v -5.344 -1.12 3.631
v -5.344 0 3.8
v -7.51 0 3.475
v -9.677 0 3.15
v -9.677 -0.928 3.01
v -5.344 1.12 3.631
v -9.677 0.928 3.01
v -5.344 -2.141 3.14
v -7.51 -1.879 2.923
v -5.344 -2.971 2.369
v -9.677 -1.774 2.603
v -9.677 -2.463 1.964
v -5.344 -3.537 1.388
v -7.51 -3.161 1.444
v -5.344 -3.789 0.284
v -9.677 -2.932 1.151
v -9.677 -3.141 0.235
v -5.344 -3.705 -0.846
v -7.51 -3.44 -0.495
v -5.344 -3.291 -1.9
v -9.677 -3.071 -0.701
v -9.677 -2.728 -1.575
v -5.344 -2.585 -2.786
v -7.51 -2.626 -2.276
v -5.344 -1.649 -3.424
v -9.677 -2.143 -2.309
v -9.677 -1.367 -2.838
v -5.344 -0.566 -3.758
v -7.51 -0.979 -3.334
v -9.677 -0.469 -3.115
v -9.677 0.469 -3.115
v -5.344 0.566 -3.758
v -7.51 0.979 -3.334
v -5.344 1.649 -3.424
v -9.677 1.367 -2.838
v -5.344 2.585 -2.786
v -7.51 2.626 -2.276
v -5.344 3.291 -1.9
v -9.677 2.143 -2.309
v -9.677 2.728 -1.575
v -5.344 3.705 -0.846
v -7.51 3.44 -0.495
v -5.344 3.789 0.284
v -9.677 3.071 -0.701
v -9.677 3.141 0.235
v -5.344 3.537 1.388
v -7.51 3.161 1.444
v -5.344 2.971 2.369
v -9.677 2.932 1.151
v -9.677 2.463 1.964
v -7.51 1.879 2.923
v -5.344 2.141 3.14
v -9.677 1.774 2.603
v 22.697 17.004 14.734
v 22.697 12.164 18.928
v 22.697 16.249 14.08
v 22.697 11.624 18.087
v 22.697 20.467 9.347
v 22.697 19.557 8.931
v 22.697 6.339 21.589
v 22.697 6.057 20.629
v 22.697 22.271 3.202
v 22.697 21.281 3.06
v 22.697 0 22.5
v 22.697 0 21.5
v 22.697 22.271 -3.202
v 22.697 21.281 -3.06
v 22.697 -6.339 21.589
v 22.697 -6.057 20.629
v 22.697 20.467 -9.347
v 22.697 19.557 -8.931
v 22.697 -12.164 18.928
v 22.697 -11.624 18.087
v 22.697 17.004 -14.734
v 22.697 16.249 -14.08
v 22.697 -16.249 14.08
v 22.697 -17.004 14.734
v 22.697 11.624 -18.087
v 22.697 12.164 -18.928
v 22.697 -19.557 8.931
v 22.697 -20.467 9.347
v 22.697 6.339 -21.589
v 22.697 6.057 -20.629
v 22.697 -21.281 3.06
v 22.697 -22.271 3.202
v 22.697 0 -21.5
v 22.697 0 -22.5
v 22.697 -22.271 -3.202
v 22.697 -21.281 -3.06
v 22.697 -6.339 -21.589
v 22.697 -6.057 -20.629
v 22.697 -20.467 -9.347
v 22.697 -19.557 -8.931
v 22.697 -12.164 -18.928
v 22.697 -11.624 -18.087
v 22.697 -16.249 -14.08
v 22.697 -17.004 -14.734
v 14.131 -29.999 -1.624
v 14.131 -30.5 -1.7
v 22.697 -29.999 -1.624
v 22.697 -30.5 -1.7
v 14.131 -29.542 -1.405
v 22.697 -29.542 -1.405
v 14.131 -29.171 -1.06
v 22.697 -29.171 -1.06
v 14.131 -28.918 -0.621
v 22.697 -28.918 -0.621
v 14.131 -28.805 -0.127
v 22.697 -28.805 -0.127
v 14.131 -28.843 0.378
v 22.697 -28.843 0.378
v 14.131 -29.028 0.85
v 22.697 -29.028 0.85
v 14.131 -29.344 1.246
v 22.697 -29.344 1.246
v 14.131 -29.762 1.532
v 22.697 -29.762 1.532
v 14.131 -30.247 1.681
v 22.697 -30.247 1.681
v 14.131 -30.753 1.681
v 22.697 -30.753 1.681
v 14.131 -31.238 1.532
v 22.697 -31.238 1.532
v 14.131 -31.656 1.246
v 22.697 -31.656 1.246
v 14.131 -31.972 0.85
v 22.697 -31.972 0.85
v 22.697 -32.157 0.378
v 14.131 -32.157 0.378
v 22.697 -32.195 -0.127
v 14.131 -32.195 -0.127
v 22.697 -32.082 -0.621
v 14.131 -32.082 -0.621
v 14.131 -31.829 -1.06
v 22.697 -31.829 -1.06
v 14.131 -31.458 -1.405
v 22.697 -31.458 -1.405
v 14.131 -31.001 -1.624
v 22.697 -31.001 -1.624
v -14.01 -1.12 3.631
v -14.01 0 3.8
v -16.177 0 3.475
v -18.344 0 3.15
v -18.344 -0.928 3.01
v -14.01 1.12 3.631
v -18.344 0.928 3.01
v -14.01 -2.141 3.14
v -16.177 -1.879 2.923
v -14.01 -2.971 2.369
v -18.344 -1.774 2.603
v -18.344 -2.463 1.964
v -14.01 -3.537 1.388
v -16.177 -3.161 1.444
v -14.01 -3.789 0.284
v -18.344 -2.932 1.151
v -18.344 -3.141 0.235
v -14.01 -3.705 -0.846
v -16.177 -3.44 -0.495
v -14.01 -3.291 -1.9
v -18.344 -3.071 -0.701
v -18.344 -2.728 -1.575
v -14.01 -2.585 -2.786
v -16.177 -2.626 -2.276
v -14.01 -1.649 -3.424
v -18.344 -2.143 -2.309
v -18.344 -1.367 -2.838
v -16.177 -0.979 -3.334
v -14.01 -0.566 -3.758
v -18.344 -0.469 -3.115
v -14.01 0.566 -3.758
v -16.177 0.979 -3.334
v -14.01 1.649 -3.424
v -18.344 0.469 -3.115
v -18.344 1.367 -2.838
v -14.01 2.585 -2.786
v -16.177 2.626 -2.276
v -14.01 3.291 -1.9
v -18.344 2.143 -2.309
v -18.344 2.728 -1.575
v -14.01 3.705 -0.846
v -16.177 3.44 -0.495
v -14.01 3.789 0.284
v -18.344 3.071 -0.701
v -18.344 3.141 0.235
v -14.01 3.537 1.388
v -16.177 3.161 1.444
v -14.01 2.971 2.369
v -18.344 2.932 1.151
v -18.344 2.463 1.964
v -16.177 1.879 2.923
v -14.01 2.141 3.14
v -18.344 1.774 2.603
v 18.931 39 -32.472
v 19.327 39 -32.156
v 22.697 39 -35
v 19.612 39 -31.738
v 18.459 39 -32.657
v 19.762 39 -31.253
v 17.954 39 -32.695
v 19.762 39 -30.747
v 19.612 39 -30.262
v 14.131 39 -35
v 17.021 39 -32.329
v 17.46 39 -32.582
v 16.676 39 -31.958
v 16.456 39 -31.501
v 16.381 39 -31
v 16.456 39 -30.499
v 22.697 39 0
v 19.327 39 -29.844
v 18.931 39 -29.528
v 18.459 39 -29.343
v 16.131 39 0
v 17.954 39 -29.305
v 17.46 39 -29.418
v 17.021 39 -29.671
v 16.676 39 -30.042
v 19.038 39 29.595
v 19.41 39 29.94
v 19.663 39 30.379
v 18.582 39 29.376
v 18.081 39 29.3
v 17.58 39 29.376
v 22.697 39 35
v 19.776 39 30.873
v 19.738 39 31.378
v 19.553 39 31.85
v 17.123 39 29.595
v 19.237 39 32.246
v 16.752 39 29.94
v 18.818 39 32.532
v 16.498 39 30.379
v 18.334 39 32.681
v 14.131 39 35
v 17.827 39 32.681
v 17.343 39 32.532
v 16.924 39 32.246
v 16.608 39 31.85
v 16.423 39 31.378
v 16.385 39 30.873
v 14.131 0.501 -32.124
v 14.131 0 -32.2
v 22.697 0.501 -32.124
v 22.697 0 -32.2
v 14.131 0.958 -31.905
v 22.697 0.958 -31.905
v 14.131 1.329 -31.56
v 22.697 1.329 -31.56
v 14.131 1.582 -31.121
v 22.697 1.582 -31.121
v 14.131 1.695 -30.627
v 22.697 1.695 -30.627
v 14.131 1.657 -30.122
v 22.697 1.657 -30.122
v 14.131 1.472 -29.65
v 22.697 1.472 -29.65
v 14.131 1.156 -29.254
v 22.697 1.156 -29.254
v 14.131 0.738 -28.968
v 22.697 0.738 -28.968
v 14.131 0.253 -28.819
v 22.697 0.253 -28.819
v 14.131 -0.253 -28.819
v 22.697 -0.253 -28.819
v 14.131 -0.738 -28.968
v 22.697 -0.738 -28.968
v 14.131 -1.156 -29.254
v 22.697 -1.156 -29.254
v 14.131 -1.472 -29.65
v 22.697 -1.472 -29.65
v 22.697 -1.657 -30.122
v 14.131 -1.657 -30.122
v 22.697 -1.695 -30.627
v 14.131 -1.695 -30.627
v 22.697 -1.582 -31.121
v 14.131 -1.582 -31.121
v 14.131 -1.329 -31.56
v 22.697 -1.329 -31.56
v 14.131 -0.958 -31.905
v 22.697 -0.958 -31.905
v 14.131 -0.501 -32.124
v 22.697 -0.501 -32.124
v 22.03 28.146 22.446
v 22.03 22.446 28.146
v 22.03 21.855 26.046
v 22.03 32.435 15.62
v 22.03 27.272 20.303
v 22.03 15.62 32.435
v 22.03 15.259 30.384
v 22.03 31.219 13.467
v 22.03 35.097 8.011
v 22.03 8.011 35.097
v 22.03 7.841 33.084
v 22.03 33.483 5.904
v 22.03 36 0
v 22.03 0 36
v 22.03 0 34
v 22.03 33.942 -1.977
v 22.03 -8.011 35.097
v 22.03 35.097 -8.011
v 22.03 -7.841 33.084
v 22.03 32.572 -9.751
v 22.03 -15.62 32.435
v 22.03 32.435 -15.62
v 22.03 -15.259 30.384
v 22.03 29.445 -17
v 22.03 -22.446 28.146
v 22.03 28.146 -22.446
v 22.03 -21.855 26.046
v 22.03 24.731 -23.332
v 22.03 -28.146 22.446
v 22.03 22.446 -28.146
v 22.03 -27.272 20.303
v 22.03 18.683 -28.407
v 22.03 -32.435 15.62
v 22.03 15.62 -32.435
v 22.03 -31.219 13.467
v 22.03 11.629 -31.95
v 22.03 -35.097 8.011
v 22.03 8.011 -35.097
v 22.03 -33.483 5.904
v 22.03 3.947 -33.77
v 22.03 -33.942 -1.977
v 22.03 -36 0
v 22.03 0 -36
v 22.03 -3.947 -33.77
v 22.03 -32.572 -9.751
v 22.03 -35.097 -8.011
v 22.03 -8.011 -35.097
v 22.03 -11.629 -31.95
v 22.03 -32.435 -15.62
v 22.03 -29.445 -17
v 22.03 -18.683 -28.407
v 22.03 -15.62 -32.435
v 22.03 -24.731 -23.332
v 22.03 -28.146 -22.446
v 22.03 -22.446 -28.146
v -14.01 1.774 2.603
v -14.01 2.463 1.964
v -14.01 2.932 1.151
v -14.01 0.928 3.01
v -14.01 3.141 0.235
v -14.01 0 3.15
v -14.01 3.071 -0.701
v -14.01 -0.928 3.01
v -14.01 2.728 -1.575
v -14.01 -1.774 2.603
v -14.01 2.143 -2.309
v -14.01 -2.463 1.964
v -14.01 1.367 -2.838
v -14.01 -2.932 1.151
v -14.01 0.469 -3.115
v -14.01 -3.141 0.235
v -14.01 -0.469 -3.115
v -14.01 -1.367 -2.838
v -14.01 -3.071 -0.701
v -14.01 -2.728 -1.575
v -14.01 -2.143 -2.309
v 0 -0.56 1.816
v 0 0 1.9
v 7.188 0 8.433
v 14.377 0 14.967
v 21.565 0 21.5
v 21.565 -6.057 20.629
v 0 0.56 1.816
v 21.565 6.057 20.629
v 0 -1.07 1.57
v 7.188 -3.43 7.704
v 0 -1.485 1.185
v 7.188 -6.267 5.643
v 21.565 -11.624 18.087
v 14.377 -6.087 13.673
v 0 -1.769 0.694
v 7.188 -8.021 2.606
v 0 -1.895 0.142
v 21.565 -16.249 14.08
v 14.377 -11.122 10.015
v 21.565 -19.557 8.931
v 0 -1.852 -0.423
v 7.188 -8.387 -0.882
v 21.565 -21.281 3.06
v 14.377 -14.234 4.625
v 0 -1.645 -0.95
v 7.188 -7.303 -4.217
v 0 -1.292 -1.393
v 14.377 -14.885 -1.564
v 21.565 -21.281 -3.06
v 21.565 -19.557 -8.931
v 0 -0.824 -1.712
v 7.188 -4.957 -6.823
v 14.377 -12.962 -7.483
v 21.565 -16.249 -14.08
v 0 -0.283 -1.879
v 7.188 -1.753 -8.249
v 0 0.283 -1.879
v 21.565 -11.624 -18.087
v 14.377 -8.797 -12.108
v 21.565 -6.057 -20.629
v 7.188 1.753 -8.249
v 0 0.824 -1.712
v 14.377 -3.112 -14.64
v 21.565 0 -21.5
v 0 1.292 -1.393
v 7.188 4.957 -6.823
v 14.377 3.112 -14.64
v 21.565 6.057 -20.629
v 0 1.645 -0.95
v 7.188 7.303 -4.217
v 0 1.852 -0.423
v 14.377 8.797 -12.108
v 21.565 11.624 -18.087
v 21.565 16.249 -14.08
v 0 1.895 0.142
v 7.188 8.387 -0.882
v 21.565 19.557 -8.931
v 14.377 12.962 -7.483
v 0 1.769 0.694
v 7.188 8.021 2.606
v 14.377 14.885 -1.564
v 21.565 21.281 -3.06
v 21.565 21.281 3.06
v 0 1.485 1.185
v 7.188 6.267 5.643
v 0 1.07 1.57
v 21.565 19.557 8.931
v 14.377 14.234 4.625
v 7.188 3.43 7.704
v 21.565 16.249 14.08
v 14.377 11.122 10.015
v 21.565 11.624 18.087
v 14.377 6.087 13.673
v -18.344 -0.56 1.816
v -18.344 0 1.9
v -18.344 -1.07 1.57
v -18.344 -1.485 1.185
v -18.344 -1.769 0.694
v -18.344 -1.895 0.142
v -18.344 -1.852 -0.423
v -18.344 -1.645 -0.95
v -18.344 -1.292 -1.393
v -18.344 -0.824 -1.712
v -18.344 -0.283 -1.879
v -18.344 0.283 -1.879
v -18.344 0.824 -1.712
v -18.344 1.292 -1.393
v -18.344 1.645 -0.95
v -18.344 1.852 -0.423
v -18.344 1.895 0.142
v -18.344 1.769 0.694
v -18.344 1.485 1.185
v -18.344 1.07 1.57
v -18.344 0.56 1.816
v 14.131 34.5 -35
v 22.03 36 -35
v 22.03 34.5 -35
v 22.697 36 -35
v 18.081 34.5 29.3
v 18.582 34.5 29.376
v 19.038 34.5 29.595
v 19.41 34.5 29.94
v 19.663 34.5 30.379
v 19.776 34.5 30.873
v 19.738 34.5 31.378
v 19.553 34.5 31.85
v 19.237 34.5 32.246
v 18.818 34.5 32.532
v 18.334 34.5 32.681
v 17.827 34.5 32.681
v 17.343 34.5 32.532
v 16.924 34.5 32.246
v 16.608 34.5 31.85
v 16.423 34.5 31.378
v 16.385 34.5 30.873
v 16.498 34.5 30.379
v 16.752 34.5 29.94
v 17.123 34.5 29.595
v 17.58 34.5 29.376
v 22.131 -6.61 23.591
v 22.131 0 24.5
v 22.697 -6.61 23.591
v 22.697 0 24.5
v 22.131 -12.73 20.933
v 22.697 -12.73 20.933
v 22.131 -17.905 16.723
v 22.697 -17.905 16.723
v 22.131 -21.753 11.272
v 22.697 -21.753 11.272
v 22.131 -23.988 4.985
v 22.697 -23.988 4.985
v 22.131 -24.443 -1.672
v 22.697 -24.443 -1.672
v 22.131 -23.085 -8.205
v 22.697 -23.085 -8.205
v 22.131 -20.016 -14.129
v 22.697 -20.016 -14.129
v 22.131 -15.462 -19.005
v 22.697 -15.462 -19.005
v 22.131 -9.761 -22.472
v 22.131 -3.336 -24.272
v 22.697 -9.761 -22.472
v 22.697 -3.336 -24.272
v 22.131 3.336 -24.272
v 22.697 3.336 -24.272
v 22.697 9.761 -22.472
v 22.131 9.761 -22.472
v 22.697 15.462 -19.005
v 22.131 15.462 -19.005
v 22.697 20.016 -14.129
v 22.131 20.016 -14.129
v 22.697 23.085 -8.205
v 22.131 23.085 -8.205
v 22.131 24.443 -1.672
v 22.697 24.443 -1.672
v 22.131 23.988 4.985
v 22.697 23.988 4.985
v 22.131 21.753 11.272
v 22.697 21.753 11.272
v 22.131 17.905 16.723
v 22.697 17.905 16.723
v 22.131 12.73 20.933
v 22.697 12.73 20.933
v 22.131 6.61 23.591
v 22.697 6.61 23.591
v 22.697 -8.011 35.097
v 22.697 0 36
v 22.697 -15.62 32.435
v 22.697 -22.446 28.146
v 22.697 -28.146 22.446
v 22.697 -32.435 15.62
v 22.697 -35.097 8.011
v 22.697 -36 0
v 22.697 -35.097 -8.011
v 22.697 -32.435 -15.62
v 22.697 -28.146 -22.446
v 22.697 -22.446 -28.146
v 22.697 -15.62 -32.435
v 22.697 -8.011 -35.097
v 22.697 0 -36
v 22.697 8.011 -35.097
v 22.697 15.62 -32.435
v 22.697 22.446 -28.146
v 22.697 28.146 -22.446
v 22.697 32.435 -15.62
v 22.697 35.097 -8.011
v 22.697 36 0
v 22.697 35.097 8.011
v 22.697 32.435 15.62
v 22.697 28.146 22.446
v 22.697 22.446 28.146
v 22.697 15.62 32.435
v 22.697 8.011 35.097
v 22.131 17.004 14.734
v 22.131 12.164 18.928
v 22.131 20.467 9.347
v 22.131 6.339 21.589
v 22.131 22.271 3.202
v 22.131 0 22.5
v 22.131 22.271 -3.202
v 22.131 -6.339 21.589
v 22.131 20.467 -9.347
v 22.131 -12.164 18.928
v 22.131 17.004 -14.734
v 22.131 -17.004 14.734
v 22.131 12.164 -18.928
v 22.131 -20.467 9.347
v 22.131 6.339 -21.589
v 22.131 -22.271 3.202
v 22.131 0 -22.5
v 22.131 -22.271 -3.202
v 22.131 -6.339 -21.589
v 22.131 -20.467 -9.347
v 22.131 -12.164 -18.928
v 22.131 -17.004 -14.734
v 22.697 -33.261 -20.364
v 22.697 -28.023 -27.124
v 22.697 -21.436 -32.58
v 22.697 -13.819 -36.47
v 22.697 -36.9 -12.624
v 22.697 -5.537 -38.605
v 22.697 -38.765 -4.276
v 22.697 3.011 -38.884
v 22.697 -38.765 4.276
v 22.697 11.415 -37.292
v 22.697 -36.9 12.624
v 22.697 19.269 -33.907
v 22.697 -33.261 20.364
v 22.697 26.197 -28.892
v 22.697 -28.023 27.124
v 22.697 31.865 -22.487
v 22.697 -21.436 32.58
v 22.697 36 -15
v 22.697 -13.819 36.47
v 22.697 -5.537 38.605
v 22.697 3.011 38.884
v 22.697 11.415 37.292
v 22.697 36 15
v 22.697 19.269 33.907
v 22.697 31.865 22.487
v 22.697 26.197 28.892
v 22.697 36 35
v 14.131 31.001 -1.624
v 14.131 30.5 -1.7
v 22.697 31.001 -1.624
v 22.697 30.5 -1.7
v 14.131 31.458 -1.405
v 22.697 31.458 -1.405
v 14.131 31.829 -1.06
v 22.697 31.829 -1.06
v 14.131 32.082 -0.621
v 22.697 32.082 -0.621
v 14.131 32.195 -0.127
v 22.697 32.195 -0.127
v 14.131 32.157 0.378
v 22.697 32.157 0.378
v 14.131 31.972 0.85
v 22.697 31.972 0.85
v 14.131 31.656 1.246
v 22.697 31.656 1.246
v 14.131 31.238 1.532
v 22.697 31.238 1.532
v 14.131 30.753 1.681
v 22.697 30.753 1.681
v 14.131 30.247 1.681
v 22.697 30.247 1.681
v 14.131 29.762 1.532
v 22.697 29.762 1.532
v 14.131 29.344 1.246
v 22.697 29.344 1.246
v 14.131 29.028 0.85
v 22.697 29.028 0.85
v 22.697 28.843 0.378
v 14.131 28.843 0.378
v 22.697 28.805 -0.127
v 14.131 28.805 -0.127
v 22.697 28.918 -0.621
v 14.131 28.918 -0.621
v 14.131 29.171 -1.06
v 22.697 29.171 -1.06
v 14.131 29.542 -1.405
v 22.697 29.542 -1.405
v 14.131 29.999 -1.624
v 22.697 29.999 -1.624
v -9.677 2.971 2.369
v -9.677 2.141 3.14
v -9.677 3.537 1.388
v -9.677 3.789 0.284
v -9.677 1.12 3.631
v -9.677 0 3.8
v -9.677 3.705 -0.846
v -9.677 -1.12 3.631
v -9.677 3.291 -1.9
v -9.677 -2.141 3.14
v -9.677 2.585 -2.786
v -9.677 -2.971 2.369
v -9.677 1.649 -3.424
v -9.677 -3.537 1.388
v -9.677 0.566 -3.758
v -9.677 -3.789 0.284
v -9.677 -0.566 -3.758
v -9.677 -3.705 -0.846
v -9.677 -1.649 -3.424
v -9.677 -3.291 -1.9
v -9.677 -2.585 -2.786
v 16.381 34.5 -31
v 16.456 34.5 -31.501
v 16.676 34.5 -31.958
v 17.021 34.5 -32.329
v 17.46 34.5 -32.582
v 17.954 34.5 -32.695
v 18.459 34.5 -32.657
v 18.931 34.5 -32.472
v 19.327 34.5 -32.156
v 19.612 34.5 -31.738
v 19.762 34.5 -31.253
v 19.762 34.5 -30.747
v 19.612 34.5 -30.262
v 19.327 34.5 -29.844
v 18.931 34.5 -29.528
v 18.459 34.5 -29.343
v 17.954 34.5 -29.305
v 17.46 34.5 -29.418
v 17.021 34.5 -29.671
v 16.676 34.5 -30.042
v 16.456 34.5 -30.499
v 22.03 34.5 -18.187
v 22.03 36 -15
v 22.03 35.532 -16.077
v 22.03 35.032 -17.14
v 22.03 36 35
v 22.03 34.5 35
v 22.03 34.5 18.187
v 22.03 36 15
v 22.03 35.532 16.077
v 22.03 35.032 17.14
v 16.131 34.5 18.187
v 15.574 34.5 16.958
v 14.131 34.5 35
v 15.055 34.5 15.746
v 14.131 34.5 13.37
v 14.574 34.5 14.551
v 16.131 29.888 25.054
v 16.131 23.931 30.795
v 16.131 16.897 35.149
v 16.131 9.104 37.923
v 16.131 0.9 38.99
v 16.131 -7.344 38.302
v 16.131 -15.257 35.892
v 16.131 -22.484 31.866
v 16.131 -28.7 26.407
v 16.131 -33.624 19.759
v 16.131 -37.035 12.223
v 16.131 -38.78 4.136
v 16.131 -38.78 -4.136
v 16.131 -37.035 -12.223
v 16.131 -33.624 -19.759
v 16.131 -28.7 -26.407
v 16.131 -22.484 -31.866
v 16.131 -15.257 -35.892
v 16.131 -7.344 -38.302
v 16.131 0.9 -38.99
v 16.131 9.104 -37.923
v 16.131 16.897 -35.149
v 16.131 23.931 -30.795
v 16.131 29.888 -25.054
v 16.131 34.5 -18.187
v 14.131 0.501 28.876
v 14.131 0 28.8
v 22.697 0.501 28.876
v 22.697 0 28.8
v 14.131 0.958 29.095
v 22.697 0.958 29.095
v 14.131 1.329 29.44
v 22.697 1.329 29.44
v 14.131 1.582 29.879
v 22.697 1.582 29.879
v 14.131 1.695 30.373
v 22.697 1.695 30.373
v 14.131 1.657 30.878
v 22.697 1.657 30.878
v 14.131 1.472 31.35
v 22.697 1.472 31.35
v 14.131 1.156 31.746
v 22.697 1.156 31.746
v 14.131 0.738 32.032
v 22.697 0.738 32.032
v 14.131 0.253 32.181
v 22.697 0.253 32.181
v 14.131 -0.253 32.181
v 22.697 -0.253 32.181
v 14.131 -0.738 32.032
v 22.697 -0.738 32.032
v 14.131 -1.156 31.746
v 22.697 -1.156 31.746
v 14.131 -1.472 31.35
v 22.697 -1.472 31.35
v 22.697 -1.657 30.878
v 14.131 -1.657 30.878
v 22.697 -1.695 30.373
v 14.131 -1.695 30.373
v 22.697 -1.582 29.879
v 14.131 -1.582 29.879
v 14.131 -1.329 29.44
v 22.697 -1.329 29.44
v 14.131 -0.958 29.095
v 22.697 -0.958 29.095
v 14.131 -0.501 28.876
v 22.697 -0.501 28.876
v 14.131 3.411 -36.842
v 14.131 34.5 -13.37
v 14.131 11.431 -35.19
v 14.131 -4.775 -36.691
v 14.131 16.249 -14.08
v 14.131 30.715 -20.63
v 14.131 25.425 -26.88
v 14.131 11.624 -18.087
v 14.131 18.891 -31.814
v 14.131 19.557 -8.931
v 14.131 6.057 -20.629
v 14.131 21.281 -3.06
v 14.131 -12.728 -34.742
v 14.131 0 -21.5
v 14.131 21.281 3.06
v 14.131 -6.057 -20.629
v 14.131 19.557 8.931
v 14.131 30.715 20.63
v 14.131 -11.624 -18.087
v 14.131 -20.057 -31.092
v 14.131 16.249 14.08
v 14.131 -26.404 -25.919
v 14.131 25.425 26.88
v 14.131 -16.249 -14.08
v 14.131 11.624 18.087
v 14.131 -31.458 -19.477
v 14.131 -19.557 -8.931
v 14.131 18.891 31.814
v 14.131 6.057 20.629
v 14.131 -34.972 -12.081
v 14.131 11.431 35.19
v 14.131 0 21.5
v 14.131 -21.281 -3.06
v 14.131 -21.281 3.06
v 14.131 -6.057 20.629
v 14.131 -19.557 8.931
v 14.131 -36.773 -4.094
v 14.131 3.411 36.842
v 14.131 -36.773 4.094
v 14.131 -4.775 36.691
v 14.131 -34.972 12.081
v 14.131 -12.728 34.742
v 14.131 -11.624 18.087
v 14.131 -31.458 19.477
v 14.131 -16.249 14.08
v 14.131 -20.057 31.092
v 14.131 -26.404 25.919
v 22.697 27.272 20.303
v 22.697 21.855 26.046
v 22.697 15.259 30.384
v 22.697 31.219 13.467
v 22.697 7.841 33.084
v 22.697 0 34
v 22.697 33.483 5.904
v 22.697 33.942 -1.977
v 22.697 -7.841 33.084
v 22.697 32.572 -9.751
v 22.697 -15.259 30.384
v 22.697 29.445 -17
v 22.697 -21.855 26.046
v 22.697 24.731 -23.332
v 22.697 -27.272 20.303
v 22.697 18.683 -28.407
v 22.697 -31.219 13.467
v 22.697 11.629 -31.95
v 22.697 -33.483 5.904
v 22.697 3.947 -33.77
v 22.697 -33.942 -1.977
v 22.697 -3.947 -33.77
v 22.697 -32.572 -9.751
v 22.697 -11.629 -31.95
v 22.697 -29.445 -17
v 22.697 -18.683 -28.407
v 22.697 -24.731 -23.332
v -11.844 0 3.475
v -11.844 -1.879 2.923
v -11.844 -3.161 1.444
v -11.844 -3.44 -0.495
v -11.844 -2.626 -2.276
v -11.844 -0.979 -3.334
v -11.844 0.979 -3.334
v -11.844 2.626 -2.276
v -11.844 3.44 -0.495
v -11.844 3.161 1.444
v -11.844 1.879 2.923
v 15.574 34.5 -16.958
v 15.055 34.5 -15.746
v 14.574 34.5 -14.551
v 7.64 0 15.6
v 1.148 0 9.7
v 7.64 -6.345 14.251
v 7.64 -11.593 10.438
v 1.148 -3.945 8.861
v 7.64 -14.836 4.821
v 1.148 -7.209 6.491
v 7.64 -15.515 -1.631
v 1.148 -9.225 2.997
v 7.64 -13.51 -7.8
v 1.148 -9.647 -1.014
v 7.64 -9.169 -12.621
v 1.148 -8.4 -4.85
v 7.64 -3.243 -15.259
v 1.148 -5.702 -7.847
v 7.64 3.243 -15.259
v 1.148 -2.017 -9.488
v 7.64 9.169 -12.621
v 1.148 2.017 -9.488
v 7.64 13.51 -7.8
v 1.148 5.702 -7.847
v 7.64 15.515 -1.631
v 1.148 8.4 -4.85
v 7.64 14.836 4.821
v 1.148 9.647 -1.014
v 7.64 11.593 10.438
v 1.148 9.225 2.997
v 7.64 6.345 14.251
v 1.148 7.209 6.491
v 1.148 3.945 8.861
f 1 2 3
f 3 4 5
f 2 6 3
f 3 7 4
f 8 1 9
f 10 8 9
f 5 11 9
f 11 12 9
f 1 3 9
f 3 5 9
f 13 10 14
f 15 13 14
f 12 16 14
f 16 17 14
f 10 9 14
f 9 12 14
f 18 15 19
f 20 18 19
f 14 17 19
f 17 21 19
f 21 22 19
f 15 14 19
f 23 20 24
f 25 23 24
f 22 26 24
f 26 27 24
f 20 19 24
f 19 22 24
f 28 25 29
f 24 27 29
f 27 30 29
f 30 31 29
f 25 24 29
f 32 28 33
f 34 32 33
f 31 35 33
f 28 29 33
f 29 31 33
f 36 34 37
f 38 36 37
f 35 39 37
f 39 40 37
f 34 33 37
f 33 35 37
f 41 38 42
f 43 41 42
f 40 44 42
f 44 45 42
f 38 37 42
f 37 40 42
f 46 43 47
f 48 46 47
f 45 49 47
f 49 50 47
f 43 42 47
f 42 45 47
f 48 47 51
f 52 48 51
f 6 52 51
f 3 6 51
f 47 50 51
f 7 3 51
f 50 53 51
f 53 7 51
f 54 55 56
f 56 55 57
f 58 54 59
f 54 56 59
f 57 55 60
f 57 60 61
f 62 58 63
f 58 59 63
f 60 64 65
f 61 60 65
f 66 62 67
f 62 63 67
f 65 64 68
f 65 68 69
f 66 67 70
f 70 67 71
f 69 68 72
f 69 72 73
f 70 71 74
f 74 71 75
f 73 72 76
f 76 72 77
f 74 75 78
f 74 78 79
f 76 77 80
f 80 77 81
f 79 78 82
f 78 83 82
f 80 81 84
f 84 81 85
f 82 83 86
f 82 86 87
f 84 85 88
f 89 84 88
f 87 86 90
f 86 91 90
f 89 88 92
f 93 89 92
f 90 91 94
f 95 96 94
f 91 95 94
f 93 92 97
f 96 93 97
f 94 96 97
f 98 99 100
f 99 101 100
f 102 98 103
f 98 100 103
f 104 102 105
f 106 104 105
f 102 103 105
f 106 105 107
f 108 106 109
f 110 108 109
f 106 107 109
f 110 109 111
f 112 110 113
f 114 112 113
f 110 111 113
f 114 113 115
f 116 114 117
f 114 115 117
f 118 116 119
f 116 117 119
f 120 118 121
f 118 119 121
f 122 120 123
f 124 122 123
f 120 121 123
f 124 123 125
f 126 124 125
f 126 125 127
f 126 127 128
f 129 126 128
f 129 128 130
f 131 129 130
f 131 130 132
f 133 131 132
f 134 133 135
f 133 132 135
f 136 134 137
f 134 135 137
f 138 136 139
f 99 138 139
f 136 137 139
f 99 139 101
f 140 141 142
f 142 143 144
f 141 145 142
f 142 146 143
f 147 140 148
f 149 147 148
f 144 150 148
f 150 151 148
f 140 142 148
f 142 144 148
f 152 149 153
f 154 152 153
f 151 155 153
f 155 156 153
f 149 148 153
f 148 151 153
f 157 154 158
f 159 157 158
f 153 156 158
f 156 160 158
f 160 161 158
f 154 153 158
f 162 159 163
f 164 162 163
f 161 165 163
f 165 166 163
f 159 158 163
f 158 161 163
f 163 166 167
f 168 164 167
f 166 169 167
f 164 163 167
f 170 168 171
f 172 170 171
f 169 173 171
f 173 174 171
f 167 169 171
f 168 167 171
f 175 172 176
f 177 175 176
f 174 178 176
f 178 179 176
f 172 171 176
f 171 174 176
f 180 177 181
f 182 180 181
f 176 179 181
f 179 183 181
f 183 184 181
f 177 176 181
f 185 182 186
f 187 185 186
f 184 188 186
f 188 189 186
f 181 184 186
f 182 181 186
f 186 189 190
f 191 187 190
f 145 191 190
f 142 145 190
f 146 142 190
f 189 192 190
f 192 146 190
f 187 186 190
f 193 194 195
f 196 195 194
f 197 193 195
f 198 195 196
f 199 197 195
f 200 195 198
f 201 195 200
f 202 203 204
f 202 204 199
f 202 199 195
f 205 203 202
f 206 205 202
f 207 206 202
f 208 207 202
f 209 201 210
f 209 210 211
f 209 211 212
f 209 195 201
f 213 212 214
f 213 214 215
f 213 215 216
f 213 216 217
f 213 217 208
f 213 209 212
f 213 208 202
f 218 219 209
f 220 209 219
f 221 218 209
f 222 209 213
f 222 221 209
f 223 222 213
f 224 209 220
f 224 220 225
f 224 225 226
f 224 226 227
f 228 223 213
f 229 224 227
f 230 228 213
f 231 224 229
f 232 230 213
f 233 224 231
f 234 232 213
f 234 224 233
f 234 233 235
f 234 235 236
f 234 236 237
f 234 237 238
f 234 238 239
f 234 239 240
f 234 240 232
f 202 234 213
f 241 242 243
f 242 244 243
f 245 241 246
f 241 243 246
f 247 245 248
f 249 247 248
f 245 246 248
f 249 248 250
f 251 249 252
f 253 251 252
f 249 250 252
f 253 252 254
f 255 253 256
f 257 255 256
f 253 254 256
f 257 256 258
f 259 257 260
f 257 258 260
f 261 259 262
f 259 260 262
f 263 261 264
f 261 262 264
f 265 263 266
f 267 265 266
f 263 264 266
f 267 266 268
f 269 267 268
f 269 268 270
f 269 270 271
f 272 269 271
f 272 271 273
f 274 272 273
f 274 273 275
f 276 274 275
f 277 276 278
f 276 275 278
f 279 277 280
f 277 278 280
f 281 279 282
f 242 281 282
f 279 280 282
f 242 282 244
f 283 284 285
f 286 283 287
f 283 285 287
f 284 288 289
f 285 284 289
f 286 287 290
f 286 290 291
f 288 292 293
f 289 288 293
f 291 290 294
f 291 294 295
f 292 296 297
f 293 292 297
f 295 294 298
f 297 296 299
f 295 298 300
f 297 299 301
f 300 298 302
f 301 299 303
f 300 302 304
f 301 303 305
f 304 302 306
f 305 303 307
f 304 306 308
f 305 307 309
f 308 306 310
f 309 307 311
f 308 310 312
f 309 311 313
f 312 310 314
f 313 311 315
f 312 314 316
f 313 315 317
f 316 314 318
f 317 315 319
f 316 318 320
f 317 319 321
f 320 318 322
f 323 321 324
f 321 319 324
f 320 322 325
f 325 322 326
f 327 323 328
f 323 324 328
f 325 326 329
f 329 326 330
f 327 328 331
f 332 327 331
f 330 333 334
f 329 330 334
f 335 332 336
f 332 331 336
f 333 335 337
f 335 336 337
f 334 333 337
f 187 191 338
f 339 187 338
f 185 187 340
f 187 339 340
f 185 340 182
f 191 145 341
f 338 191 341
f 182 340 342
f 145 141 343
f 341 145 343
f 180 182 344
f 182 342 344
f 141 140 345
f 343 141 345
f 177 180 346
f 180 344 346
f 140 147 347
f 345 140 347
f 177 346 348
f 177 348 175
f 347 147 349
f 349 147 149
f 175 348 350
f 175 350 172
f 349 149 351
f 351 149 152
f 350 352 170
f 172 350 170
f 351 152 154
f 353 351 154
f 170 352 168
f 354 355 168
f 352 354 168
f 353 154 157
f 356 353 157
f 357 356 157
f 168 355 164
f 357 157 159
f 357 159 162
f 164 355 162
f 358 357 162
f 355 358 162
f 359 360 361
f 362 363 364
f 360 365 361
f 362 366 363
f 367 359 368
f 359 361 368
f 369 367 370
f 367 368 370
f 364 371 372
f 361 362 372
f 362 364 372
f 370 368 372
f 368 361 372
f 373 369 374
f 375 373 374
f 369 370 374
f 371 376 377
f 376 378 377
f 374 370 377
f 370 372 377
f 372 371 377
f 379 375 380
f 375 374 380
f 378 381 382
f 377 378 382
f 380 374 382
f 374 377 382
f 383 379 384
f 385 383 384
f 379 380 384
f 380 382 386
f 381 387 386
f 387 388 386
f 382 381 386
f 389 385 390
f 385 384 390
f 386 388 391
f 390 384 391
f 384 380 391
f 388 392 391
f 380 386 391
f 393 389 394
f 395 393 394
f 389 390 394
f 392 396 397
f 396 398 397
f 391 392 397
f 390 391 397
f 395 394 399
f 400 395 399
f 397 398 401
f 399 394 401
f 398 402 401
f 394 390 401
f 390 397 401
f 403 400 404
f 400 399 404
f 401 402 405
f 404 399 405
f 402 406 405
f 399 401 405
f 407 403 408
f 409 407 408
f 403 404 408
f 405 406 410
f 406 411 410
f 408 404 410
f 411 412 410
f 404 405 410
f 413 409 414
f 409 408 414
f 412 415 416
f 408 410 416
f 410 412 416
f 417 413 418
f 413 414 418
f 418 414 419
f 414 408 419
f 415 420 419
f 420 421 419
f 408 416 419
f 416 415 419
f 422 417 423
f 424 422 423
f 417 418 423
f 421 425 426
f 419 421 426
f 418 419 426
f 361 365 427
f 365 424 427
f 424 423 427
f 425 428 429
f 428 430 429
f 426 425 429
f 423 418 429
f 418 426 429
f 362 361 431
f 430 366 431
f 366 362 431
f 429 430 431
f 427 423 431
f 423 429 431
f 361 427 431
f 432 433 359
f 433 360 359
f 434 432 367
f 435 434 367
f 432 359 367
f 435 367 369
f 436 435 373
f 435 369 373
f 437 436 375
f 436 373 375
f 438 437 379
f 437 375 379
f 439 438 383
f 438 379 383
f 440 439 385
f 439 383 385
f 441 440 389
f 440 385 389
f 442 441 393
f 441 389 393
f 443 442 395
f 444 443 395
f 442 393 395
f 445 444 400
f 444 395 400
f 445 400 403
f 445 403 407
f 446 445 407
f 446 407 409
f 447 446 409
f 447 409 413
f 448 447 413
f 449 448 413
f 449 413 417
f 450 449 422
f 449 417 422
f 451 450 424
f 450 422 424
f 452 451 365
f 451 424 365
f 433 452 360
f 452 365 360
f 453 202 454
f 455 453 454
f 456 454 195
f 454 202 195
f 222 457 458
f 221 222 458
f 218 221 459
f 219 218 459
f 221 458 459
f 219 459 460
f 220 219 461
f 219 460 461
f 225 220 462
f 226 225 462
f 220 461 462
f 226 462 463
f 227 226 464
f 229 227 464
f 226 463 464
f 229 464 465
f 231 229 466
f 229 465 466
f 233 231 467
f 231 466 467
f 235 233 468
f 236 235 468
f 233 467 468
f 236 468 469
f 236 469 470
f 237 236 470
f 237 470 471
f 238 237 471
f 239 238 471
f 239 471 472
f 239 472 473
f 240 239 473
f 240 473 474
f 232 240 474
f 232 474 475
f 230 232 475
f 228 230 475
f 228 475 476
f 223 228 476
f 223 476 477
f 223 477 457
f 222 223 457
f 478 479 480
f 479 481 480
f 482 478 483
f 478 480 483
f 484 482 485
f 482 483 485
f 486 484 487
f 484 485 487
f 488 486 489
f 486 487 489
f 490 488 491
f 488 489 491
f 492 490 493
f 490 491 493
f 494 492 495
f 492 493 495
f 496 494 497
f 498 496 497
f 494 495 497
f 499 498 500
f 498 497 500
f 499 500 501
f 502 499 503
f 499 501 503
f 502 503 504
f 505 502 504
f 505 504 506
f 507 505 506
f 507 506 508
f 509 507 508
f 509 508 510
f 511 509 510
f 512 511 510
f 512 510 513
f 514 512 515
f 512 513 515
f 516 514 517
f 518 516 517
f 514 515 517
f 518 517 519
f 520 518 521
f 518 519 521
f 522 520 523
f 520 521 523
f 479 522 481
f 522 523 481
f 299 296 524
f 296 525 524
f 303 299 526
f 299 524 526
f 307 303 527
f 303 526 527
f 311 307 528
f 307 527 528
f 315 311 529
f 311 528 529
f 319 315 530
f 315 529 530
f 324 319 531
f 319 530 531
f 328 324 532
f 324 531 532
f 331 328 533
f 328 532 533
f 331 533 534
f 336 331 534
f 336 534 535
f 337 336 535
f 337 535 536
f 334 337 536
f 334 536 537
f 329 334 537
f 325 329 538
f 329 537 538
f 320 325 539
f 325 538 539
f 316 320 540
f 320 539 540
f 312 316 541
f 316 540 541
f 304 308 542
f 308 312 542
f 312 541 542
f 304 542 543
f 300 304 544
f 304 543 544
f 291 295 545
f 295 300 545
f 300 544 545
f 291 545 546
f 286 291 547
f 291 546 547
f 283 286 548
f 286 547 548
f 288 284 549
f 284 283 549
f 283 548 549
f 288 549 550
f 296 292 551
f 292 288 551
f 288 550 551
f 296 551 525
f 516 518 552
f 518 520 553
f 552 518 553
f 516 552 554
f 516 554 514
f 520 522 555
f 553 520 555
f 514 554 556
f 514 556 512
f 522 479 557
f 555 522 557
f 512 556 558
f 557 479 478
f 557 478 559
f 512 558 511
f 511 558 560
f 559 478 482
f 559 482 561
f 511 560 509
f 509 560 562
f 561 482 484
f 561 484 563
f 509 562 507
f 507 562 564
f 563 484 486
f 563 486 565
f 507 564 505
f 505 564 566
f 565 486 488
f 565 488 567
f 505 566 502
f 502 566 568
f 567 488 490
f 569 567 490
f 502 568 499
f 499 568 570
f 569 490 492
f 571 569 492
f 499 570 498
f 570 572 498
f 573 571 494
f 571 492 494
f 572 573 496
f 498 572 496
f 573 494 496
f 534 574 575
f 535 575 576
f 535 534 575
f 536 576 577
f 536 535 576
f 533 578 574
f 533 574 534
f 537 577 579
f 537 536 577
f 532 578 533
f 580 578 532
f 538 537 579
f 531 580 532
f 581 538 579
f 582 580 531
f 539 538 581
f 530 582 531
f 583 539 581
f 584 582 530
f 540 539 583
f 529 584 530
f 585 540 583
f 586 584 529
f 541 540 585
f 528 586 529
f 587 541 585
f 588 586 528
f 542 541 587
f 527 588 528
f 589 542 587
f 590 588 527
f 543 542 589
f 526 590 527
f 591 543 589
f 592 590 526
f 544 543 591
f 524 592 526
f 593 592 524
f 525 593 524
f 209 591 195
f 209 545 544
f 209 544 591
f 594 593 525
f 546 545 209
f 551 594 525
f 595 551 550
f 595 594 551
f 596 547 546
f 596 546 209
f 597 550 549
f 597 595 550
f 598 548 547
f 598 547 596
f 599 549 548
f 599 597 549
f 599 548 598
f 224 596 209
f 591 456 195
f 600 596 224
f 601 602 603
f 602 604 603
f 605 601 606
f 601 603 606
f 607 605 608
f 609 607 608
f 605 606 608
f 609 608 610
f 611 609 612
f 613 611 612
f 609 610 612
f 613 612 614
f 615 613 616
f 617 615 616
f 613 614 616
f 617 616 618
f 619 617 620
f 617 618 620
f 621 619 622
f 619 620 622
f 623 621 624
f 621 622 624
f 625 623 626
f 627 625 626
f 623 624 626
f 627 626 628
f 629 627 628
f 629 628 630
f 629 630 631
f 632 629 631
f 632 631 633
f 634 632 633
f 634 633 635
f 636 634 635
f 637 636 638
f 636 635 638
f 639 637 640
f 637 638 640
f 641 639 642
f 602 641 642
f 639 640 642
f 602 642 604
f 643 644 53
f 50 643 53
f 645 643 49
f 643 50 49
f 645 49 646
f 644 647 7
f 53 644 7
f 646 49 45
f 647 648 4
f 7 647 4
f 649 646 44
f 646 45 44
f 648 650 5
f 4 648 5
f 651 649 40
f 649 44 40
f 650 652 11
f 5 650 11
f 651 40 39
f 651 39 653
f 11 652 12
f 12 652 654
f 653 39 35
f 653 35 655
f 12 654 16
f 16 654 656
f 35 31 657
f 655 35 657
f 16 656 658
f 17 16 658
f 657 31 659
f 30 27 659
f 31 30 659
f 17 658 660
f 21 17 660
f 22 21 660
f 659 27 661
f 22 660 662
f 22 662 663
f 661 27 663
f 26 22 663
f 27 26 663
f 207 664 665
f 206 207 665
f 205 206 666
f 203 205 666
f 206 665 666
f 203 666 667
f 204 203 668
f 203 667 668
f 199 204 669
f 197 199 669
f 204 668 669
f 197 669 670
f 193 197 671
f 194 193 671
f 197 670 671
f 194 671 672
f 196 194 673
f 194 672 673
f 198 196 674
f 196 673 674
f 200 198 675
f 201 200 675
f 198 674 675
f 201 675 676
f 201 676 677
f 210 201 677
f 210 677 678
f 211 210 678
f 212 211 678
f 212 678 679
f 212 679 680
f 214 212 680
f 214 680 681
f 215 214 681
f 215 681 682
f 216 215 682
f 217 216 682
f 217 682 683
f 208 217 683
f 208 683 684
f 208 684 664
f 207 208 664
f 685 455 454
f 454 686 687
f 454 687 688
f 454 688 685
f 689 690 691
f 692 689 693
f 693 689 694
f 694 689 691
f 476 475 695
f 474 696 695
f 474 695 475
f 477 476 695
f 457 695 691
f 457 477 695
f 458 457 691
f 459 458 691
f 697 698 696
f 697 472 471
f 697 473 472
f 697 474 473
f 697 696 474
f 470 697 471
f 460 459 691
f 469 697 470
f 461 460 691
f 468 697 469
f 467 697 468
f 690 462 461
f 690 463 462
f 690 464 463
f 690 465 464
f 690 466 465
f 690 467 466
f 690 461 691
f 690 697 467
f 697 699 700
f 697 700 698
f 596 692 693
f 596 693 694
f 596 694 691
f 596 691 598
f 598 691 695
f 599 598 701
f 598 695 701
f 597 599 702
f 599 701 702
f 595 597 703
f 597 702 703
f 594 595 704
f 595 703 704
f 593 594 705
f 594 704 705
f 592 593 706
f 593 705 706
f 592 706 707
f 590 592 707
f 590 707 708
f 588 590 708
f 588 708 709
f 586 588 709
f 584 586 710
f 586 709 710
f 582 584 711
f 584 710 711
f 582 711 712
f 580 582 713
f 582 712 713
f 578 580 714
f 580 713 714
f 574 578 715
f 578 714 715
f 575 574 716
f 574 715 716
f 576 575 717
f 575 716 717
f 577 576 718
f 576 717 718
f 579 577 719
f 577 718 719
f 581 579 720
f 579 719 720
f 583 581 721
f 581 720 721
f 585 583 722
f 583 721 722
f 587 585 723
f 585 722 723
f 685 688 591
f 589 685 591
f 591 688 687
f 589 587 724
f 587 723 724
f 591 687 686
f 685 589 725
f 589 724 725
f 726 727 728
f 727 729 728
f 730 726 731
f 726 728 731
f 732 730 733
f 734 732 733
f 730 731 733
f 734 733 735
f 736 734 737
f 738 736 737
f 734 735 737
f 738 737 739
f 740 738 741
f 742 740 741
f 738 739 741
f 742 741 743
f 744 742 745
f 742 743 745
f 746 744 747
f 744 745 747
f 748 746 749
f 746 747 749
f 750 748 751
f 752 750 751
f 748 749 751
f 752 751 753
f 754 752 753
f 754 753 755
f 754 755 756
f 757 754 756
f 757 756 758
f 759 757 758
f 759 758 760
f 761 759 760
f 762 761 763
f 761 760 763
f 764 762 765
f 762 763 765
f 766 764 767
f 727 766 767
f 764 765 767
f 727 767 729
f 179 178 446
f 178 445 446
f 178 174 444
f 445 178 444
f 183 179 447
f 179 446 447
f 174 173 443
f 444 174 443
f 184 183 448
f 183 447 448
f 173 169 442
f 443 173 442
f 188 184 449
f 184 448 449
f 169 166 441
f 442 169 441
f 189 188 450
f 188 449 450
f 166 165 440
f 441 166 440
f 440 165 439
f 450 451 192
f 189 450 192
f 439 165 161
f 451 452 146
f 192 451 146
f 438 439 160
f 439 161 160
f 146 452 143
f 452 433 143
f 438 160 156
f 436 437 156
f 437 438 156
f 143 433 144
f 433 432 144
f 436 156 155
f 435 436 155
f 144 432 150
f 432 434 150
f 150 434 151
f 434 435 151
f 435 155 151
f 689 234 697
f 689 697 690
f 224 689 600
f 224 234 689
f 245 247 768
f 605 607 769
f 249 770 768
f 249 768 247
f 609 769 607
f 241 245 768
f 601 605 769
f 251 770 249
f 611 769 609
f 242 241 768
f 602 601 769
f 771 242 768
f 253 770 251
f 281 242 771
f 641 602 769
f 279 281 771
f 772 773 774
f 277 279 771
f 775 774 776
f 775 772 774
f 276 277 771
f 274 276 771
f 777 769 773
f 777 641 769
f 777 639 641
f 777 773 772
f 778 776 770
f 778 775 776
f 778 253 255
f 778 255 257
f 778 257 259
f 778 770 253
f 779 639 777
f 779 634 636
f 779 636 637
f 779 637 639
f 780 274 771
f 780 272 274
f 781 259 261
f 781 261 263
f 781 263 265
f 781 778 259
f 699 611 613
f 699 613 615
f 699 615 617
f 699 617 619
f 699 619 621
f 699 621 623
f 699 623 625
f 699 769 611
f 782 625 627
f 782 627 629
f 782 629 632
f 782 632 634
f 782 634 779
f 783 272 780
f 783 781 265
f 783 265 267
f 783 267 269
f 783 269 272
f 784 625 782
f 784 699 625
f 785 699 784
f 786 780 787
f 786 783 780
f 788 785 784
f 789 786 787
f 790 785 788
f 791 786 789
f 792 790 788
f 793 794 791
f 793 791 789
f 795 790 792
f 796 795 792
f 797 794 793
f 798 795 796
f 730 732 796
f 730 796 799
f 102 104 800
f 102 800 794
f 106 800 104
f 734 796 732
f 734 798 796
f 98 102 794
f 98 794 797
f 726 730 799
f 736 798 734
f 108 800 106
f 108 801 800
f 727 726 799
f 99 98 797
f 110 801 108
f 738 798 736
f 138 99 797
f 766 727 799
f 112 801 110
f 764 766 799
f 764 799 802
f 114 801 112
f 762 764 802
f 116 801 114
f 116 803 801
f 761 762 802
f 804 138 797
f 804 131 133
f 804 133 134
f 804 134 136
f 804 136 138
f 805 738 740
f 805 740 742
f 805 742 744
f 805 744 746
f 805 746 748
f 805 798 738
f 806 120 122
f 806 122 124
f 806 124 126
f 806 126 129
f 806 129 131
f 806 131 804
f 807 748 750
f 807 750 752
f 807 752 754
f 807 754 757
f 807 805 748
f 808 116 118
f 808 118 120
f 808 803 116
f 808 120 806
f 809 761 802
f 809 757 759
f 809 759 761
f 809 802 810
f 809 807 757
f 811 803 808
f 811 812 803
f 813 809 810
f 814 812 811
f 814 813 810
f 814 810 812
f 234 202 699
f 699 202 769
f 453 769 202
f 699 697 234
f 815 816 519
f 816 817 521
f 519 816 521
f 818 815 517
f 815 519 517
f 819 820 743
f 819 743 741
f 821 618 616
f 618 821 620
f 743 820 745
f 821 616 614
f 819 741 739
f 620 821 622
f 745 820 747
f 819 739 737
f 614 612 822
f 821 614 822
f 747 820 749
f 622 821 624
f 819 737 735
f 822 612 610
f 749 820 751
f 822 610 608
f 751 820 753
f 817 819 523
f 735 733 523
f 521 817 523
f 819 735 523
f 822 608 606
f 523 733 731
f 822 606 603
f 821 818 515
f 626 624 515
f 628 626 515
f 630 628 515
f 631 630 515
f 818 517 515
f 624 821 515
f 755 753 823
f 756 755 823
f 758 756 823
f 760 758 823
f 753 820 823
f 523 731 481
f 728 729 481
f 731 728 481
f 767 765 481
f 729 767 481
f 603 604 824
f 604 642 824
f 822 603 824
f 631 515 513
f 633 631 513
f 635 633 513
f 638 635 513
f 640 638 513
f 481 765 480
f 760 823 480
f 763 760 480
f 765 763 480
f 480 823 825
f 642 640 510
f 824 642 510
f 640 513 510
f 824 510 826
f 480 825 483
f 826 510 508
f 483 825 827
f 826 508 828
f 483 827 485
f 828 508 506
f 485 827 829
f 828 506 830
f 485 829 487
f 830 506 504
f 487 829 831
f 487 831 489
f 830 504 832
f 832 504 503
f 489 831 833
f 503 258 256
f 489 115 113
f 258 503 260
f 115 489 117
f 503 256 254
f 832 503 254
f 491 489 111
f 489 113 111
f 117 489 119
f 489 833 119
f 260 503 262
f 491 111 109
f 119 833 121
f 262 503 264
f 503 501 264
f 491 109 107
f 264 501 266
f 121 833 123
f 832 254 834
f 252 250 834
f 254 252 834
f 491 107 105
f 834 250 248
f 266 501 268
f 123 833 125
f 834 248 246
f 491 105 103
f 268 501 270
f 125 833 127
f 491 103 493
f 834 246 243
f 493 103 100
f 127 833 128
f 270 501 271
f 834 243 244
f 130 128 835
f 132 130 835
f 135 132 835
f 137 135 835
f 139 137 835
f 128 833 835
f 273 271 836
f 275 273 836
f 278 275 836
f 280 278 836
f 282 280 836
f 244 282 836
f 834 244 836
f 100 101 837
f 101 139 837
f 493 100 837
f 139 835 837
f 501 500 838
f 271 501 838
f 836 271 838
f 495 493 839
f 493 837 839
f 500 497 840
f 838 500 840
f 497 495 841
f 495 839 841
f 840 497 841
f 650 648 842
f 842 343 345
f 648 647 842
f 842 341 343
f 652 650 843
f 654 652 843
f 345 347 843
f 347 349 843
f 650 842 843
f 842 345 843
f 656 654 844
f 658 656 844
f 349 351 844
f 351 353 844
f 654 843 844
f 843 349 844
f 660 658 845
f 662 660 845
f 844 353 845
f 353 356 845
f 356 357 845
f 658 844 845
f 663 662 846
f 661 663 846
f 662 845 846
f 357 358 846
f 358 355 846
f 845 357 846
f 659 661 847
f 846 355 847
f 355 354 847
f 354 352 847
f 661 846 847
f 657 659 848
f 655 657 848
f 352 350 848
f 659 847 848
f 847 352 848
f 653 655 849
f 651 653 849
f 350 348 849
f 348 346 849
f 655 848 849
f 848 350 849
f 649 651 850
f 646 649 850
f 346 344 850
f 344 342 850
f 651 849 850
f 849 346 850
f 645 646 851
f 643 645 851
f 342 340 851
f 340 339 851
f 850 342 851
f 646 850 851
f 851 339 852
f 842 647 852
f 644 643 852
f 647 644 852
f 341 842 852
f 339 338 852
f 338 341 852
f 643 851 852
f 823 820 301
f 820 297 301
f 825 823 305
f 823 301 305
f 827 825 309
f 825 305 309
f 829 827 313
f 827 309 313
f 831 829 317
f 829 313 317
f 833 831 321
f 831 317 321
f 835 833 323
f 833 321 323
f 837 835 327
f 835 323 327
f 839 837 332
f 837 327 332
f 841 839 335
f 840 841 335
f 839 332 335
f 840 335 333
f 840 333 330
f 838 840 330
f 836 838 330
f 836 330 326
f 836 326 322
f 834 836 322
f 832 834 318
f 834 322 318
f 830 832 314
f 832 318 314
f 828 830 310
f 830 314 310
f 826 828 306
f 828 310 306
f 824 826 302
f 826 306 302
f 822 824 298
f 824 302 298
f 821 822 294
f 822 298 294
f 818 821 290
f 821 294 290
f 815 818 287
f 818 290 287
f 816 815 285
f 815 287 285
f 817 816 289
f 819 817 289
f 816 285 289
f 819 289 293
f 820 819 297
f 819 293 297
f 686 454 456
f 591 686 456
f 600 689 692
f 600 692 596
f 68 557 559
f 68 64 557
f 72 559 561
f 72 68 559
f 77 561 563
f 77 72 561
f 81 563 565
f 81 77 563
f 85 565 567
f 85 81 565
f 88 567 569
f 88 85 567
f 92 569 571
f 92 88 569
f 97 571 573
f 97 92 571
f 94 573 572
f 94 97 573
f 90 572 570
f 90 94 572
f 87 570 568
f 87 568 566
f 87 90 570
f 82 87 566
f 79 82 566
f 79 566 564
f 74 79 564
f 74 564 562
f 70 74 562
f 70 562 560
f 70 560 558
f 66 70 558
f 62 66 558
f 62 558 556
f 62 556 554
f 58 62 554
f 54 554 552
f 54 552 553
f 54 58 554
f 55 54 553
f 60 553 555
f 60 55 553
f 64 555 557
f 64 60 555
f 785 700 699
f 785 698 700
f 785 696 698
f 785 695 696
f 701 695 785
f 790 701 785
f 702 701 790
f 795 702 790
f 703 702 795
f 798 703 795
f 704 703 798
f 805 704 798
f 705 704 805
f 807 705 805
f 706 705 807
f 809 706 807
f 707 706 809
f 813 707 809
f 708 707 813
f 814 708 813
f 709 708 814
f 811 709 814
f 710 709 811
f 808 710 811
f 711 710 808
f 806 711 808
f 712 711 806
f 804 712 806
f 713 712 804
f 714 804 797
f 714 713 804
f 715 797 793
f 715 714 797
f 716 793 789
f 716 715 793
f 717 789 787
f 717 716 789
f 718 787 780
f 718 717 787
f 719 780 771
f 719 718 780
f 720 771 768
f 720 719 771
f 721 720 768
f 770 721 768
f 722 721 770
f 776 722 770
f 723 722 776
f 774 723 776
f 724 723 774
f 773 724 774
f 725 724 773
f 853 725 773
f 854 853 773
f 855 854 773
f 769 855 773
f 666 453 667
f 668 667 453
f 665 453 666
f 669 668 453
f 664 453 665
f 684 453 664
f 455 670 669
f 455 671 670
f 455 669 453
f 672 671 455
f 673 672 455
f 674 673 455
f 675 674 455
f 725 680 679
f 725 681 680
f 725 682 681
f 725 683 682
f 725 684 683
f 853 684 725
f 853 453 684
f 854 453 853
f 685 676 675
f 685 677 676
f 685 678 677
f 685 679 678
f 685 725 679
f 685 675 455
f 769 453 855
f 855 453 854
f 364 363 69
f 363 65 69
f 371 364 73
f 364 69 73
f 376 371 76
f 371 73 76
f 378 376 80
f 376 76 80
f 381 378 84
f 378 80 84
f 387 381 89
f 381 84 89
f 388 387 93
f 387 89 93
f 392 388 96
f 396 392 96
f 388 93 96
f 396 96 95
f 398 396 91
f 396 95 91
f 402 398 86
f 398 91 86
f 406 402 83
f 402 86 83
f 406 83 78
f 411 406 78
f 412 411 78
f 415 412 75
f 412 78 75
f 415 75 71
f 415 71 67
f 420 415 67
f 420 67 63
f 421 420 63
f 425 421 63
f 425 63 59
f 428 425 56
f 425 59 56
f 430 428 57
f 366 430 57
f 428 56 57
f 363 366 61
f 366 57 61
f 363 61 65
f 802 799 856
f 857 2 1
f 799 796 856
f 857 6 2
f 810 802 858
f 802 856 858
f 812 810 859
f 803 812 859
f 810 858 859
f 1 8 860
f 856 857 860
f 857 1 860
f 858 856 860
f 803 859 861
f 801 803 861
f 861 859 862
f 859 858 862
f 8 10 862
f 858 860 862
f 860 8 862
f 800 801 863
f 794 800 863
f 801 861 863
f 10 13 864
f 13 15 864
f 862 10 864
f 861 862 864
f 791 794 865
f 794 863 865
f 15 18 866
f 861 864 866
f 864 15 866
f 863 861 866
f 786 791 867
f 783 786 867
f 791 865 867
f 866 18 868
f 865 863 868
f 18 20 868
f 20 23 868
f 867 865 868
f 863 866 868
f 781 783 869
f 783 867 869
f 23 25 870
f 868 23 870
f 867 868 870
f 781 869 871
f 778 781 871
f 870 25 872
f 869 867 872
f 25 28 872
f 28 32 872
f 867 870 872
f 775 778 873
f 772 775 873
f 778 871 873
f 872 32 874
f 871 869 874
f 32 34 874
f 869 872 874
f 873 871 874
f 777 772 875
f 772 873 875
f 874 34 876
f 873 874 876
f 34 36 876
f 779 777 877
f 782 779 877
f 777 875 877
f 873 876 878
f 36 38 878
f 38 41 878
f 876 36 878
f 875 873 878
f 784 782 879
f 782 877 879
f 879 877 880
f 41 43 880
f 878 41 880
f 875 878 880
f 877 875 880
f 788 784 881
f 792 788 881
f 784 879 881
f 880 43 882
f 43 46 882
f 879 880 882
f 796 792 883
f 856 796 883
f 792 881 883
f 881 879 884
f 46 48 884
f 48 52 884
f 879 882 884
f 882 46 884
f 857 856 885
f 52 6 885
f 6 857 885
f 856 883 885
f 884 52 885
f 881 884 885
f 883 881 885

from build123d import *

# Parameters (mm, degrees)
SKETCH1_W                = 0.566
SKETCH1_H                = 1
M3_CLEARANCE_HOLE1_D     = 3.4
M3_CLEARANCE_HOLE1_DEPTH = 8.566
M3_CLEARANCE_HOLE1_TIP   = 1.021463052
CHAMFER1_SIZE            = 2
BOSS_EXTRUDE1_DEPTH      = 35
SKETCH9_R                = 1.7
CUT_EXTRUDE1_DEPTH       = 10


with BuildPart() as part:
    # Sketch1 → Revolve17 (revolve)
    with BuildSketch(Plane.XY, mode=Mode.PRIVATE) as revolve17_sk:
        Polygon((14.13111535, 39), (14.13111535, 34.5), (22.03011535, 34.5), (22.03011535, 36), (22.69711535, 36), (22.69711535, 39), align=None)
        Polygon((-14.010170791, 3.15), (-14.010170791, 3.8), (-18.343504124, 3.15), (-18.343504124, 1.9), (0, 1.9), (21.56511535, 21.5), (22.13111535, 21.5), (22.13111535, 22.5), (22.13111535, 24.5), (22.69711535, 24.5), (22.69711535, 34), (22.03011535, 34), (22.03011535, 34.5), (14.13111535, 34.5), (14.13111535, 21.5), (-5.343504124, 3.8), (-9.676837458, 3.15), (-9.676837458, 3.8), align=None)
        with Locations((22.41411535, 22)):
            Rectangle(SKETCH1_W, SKETCH1_H)
    revolve(revolve17_sk.sketch.rotate(Axis((-801.927103621, 0, 0), (1, 0, 0)), 90), axis=Axis((-801.927103621, 0, 0), (1, 0, 0)))

    # M3 Clearance Hole1
    with Locations(Plane.ZY.offset(-14.13111535)):
        with Locations((0, -30.5), (0, 30.5), (30.5, 0), (-30.5, 0)):
            Hole(M3_CLEARANCE_HOLE1_D / 2, depth=M3_CLEARANCE_HOLE1_DEPTH)
            with Locations((0, 0, -(M3_CLEARANCE_HOLE1_DEPTH + M3_CLEARANCE_HOLE1_TIP / 2))):  # 118° drill point
                Cone(0, M3_CLEARANCE_HOLE1_D / 2, M3_CLEARANCE_HOLE1_TIP, mode=Mode.SUBTRACT)

    # Chamfer1
    chamfer1_edges = [part.edges().sort_by_distance(p)[0] for p in [
        (14.13111535, 0, -39),
    ]]
    chamfer(chamfer1_edges, length=CHAMFER1_SIZE)

    # Sketch1<11> → Boss-Extrude1 (add, symmetric)
    with BuildSketch(Plane.XY):
        Polygon((14.13111535, 39), (14.13111535, 34.5), (22.03011535, 34.5), (22.03011535, 36), (22.69711535, 36), (22.69711535, 39), align=None)
    extrude(amount=BOSS_EXTRUDE1_DEPTH, both=True)

    # Sketch9 → Cut-Extrude1 (cut)
    with BuildSketch(Plane(origin=(0, 34.5, 0), x_dir=(-1, 0, 0), z_dir=(0, -1, 0))):
        with Locations(Location((-18.08061535, -31, 0), (0, 0, 90))):
            Circle(SKETCH9_R)
        with Locations((-18.08061535, 31)):
            Circle(SKETCH9_R)
    extrude(amount=-CUT_EXTRUDE1_DEPTH, mode=Mode.SUBTRACT)


solid = part.part
